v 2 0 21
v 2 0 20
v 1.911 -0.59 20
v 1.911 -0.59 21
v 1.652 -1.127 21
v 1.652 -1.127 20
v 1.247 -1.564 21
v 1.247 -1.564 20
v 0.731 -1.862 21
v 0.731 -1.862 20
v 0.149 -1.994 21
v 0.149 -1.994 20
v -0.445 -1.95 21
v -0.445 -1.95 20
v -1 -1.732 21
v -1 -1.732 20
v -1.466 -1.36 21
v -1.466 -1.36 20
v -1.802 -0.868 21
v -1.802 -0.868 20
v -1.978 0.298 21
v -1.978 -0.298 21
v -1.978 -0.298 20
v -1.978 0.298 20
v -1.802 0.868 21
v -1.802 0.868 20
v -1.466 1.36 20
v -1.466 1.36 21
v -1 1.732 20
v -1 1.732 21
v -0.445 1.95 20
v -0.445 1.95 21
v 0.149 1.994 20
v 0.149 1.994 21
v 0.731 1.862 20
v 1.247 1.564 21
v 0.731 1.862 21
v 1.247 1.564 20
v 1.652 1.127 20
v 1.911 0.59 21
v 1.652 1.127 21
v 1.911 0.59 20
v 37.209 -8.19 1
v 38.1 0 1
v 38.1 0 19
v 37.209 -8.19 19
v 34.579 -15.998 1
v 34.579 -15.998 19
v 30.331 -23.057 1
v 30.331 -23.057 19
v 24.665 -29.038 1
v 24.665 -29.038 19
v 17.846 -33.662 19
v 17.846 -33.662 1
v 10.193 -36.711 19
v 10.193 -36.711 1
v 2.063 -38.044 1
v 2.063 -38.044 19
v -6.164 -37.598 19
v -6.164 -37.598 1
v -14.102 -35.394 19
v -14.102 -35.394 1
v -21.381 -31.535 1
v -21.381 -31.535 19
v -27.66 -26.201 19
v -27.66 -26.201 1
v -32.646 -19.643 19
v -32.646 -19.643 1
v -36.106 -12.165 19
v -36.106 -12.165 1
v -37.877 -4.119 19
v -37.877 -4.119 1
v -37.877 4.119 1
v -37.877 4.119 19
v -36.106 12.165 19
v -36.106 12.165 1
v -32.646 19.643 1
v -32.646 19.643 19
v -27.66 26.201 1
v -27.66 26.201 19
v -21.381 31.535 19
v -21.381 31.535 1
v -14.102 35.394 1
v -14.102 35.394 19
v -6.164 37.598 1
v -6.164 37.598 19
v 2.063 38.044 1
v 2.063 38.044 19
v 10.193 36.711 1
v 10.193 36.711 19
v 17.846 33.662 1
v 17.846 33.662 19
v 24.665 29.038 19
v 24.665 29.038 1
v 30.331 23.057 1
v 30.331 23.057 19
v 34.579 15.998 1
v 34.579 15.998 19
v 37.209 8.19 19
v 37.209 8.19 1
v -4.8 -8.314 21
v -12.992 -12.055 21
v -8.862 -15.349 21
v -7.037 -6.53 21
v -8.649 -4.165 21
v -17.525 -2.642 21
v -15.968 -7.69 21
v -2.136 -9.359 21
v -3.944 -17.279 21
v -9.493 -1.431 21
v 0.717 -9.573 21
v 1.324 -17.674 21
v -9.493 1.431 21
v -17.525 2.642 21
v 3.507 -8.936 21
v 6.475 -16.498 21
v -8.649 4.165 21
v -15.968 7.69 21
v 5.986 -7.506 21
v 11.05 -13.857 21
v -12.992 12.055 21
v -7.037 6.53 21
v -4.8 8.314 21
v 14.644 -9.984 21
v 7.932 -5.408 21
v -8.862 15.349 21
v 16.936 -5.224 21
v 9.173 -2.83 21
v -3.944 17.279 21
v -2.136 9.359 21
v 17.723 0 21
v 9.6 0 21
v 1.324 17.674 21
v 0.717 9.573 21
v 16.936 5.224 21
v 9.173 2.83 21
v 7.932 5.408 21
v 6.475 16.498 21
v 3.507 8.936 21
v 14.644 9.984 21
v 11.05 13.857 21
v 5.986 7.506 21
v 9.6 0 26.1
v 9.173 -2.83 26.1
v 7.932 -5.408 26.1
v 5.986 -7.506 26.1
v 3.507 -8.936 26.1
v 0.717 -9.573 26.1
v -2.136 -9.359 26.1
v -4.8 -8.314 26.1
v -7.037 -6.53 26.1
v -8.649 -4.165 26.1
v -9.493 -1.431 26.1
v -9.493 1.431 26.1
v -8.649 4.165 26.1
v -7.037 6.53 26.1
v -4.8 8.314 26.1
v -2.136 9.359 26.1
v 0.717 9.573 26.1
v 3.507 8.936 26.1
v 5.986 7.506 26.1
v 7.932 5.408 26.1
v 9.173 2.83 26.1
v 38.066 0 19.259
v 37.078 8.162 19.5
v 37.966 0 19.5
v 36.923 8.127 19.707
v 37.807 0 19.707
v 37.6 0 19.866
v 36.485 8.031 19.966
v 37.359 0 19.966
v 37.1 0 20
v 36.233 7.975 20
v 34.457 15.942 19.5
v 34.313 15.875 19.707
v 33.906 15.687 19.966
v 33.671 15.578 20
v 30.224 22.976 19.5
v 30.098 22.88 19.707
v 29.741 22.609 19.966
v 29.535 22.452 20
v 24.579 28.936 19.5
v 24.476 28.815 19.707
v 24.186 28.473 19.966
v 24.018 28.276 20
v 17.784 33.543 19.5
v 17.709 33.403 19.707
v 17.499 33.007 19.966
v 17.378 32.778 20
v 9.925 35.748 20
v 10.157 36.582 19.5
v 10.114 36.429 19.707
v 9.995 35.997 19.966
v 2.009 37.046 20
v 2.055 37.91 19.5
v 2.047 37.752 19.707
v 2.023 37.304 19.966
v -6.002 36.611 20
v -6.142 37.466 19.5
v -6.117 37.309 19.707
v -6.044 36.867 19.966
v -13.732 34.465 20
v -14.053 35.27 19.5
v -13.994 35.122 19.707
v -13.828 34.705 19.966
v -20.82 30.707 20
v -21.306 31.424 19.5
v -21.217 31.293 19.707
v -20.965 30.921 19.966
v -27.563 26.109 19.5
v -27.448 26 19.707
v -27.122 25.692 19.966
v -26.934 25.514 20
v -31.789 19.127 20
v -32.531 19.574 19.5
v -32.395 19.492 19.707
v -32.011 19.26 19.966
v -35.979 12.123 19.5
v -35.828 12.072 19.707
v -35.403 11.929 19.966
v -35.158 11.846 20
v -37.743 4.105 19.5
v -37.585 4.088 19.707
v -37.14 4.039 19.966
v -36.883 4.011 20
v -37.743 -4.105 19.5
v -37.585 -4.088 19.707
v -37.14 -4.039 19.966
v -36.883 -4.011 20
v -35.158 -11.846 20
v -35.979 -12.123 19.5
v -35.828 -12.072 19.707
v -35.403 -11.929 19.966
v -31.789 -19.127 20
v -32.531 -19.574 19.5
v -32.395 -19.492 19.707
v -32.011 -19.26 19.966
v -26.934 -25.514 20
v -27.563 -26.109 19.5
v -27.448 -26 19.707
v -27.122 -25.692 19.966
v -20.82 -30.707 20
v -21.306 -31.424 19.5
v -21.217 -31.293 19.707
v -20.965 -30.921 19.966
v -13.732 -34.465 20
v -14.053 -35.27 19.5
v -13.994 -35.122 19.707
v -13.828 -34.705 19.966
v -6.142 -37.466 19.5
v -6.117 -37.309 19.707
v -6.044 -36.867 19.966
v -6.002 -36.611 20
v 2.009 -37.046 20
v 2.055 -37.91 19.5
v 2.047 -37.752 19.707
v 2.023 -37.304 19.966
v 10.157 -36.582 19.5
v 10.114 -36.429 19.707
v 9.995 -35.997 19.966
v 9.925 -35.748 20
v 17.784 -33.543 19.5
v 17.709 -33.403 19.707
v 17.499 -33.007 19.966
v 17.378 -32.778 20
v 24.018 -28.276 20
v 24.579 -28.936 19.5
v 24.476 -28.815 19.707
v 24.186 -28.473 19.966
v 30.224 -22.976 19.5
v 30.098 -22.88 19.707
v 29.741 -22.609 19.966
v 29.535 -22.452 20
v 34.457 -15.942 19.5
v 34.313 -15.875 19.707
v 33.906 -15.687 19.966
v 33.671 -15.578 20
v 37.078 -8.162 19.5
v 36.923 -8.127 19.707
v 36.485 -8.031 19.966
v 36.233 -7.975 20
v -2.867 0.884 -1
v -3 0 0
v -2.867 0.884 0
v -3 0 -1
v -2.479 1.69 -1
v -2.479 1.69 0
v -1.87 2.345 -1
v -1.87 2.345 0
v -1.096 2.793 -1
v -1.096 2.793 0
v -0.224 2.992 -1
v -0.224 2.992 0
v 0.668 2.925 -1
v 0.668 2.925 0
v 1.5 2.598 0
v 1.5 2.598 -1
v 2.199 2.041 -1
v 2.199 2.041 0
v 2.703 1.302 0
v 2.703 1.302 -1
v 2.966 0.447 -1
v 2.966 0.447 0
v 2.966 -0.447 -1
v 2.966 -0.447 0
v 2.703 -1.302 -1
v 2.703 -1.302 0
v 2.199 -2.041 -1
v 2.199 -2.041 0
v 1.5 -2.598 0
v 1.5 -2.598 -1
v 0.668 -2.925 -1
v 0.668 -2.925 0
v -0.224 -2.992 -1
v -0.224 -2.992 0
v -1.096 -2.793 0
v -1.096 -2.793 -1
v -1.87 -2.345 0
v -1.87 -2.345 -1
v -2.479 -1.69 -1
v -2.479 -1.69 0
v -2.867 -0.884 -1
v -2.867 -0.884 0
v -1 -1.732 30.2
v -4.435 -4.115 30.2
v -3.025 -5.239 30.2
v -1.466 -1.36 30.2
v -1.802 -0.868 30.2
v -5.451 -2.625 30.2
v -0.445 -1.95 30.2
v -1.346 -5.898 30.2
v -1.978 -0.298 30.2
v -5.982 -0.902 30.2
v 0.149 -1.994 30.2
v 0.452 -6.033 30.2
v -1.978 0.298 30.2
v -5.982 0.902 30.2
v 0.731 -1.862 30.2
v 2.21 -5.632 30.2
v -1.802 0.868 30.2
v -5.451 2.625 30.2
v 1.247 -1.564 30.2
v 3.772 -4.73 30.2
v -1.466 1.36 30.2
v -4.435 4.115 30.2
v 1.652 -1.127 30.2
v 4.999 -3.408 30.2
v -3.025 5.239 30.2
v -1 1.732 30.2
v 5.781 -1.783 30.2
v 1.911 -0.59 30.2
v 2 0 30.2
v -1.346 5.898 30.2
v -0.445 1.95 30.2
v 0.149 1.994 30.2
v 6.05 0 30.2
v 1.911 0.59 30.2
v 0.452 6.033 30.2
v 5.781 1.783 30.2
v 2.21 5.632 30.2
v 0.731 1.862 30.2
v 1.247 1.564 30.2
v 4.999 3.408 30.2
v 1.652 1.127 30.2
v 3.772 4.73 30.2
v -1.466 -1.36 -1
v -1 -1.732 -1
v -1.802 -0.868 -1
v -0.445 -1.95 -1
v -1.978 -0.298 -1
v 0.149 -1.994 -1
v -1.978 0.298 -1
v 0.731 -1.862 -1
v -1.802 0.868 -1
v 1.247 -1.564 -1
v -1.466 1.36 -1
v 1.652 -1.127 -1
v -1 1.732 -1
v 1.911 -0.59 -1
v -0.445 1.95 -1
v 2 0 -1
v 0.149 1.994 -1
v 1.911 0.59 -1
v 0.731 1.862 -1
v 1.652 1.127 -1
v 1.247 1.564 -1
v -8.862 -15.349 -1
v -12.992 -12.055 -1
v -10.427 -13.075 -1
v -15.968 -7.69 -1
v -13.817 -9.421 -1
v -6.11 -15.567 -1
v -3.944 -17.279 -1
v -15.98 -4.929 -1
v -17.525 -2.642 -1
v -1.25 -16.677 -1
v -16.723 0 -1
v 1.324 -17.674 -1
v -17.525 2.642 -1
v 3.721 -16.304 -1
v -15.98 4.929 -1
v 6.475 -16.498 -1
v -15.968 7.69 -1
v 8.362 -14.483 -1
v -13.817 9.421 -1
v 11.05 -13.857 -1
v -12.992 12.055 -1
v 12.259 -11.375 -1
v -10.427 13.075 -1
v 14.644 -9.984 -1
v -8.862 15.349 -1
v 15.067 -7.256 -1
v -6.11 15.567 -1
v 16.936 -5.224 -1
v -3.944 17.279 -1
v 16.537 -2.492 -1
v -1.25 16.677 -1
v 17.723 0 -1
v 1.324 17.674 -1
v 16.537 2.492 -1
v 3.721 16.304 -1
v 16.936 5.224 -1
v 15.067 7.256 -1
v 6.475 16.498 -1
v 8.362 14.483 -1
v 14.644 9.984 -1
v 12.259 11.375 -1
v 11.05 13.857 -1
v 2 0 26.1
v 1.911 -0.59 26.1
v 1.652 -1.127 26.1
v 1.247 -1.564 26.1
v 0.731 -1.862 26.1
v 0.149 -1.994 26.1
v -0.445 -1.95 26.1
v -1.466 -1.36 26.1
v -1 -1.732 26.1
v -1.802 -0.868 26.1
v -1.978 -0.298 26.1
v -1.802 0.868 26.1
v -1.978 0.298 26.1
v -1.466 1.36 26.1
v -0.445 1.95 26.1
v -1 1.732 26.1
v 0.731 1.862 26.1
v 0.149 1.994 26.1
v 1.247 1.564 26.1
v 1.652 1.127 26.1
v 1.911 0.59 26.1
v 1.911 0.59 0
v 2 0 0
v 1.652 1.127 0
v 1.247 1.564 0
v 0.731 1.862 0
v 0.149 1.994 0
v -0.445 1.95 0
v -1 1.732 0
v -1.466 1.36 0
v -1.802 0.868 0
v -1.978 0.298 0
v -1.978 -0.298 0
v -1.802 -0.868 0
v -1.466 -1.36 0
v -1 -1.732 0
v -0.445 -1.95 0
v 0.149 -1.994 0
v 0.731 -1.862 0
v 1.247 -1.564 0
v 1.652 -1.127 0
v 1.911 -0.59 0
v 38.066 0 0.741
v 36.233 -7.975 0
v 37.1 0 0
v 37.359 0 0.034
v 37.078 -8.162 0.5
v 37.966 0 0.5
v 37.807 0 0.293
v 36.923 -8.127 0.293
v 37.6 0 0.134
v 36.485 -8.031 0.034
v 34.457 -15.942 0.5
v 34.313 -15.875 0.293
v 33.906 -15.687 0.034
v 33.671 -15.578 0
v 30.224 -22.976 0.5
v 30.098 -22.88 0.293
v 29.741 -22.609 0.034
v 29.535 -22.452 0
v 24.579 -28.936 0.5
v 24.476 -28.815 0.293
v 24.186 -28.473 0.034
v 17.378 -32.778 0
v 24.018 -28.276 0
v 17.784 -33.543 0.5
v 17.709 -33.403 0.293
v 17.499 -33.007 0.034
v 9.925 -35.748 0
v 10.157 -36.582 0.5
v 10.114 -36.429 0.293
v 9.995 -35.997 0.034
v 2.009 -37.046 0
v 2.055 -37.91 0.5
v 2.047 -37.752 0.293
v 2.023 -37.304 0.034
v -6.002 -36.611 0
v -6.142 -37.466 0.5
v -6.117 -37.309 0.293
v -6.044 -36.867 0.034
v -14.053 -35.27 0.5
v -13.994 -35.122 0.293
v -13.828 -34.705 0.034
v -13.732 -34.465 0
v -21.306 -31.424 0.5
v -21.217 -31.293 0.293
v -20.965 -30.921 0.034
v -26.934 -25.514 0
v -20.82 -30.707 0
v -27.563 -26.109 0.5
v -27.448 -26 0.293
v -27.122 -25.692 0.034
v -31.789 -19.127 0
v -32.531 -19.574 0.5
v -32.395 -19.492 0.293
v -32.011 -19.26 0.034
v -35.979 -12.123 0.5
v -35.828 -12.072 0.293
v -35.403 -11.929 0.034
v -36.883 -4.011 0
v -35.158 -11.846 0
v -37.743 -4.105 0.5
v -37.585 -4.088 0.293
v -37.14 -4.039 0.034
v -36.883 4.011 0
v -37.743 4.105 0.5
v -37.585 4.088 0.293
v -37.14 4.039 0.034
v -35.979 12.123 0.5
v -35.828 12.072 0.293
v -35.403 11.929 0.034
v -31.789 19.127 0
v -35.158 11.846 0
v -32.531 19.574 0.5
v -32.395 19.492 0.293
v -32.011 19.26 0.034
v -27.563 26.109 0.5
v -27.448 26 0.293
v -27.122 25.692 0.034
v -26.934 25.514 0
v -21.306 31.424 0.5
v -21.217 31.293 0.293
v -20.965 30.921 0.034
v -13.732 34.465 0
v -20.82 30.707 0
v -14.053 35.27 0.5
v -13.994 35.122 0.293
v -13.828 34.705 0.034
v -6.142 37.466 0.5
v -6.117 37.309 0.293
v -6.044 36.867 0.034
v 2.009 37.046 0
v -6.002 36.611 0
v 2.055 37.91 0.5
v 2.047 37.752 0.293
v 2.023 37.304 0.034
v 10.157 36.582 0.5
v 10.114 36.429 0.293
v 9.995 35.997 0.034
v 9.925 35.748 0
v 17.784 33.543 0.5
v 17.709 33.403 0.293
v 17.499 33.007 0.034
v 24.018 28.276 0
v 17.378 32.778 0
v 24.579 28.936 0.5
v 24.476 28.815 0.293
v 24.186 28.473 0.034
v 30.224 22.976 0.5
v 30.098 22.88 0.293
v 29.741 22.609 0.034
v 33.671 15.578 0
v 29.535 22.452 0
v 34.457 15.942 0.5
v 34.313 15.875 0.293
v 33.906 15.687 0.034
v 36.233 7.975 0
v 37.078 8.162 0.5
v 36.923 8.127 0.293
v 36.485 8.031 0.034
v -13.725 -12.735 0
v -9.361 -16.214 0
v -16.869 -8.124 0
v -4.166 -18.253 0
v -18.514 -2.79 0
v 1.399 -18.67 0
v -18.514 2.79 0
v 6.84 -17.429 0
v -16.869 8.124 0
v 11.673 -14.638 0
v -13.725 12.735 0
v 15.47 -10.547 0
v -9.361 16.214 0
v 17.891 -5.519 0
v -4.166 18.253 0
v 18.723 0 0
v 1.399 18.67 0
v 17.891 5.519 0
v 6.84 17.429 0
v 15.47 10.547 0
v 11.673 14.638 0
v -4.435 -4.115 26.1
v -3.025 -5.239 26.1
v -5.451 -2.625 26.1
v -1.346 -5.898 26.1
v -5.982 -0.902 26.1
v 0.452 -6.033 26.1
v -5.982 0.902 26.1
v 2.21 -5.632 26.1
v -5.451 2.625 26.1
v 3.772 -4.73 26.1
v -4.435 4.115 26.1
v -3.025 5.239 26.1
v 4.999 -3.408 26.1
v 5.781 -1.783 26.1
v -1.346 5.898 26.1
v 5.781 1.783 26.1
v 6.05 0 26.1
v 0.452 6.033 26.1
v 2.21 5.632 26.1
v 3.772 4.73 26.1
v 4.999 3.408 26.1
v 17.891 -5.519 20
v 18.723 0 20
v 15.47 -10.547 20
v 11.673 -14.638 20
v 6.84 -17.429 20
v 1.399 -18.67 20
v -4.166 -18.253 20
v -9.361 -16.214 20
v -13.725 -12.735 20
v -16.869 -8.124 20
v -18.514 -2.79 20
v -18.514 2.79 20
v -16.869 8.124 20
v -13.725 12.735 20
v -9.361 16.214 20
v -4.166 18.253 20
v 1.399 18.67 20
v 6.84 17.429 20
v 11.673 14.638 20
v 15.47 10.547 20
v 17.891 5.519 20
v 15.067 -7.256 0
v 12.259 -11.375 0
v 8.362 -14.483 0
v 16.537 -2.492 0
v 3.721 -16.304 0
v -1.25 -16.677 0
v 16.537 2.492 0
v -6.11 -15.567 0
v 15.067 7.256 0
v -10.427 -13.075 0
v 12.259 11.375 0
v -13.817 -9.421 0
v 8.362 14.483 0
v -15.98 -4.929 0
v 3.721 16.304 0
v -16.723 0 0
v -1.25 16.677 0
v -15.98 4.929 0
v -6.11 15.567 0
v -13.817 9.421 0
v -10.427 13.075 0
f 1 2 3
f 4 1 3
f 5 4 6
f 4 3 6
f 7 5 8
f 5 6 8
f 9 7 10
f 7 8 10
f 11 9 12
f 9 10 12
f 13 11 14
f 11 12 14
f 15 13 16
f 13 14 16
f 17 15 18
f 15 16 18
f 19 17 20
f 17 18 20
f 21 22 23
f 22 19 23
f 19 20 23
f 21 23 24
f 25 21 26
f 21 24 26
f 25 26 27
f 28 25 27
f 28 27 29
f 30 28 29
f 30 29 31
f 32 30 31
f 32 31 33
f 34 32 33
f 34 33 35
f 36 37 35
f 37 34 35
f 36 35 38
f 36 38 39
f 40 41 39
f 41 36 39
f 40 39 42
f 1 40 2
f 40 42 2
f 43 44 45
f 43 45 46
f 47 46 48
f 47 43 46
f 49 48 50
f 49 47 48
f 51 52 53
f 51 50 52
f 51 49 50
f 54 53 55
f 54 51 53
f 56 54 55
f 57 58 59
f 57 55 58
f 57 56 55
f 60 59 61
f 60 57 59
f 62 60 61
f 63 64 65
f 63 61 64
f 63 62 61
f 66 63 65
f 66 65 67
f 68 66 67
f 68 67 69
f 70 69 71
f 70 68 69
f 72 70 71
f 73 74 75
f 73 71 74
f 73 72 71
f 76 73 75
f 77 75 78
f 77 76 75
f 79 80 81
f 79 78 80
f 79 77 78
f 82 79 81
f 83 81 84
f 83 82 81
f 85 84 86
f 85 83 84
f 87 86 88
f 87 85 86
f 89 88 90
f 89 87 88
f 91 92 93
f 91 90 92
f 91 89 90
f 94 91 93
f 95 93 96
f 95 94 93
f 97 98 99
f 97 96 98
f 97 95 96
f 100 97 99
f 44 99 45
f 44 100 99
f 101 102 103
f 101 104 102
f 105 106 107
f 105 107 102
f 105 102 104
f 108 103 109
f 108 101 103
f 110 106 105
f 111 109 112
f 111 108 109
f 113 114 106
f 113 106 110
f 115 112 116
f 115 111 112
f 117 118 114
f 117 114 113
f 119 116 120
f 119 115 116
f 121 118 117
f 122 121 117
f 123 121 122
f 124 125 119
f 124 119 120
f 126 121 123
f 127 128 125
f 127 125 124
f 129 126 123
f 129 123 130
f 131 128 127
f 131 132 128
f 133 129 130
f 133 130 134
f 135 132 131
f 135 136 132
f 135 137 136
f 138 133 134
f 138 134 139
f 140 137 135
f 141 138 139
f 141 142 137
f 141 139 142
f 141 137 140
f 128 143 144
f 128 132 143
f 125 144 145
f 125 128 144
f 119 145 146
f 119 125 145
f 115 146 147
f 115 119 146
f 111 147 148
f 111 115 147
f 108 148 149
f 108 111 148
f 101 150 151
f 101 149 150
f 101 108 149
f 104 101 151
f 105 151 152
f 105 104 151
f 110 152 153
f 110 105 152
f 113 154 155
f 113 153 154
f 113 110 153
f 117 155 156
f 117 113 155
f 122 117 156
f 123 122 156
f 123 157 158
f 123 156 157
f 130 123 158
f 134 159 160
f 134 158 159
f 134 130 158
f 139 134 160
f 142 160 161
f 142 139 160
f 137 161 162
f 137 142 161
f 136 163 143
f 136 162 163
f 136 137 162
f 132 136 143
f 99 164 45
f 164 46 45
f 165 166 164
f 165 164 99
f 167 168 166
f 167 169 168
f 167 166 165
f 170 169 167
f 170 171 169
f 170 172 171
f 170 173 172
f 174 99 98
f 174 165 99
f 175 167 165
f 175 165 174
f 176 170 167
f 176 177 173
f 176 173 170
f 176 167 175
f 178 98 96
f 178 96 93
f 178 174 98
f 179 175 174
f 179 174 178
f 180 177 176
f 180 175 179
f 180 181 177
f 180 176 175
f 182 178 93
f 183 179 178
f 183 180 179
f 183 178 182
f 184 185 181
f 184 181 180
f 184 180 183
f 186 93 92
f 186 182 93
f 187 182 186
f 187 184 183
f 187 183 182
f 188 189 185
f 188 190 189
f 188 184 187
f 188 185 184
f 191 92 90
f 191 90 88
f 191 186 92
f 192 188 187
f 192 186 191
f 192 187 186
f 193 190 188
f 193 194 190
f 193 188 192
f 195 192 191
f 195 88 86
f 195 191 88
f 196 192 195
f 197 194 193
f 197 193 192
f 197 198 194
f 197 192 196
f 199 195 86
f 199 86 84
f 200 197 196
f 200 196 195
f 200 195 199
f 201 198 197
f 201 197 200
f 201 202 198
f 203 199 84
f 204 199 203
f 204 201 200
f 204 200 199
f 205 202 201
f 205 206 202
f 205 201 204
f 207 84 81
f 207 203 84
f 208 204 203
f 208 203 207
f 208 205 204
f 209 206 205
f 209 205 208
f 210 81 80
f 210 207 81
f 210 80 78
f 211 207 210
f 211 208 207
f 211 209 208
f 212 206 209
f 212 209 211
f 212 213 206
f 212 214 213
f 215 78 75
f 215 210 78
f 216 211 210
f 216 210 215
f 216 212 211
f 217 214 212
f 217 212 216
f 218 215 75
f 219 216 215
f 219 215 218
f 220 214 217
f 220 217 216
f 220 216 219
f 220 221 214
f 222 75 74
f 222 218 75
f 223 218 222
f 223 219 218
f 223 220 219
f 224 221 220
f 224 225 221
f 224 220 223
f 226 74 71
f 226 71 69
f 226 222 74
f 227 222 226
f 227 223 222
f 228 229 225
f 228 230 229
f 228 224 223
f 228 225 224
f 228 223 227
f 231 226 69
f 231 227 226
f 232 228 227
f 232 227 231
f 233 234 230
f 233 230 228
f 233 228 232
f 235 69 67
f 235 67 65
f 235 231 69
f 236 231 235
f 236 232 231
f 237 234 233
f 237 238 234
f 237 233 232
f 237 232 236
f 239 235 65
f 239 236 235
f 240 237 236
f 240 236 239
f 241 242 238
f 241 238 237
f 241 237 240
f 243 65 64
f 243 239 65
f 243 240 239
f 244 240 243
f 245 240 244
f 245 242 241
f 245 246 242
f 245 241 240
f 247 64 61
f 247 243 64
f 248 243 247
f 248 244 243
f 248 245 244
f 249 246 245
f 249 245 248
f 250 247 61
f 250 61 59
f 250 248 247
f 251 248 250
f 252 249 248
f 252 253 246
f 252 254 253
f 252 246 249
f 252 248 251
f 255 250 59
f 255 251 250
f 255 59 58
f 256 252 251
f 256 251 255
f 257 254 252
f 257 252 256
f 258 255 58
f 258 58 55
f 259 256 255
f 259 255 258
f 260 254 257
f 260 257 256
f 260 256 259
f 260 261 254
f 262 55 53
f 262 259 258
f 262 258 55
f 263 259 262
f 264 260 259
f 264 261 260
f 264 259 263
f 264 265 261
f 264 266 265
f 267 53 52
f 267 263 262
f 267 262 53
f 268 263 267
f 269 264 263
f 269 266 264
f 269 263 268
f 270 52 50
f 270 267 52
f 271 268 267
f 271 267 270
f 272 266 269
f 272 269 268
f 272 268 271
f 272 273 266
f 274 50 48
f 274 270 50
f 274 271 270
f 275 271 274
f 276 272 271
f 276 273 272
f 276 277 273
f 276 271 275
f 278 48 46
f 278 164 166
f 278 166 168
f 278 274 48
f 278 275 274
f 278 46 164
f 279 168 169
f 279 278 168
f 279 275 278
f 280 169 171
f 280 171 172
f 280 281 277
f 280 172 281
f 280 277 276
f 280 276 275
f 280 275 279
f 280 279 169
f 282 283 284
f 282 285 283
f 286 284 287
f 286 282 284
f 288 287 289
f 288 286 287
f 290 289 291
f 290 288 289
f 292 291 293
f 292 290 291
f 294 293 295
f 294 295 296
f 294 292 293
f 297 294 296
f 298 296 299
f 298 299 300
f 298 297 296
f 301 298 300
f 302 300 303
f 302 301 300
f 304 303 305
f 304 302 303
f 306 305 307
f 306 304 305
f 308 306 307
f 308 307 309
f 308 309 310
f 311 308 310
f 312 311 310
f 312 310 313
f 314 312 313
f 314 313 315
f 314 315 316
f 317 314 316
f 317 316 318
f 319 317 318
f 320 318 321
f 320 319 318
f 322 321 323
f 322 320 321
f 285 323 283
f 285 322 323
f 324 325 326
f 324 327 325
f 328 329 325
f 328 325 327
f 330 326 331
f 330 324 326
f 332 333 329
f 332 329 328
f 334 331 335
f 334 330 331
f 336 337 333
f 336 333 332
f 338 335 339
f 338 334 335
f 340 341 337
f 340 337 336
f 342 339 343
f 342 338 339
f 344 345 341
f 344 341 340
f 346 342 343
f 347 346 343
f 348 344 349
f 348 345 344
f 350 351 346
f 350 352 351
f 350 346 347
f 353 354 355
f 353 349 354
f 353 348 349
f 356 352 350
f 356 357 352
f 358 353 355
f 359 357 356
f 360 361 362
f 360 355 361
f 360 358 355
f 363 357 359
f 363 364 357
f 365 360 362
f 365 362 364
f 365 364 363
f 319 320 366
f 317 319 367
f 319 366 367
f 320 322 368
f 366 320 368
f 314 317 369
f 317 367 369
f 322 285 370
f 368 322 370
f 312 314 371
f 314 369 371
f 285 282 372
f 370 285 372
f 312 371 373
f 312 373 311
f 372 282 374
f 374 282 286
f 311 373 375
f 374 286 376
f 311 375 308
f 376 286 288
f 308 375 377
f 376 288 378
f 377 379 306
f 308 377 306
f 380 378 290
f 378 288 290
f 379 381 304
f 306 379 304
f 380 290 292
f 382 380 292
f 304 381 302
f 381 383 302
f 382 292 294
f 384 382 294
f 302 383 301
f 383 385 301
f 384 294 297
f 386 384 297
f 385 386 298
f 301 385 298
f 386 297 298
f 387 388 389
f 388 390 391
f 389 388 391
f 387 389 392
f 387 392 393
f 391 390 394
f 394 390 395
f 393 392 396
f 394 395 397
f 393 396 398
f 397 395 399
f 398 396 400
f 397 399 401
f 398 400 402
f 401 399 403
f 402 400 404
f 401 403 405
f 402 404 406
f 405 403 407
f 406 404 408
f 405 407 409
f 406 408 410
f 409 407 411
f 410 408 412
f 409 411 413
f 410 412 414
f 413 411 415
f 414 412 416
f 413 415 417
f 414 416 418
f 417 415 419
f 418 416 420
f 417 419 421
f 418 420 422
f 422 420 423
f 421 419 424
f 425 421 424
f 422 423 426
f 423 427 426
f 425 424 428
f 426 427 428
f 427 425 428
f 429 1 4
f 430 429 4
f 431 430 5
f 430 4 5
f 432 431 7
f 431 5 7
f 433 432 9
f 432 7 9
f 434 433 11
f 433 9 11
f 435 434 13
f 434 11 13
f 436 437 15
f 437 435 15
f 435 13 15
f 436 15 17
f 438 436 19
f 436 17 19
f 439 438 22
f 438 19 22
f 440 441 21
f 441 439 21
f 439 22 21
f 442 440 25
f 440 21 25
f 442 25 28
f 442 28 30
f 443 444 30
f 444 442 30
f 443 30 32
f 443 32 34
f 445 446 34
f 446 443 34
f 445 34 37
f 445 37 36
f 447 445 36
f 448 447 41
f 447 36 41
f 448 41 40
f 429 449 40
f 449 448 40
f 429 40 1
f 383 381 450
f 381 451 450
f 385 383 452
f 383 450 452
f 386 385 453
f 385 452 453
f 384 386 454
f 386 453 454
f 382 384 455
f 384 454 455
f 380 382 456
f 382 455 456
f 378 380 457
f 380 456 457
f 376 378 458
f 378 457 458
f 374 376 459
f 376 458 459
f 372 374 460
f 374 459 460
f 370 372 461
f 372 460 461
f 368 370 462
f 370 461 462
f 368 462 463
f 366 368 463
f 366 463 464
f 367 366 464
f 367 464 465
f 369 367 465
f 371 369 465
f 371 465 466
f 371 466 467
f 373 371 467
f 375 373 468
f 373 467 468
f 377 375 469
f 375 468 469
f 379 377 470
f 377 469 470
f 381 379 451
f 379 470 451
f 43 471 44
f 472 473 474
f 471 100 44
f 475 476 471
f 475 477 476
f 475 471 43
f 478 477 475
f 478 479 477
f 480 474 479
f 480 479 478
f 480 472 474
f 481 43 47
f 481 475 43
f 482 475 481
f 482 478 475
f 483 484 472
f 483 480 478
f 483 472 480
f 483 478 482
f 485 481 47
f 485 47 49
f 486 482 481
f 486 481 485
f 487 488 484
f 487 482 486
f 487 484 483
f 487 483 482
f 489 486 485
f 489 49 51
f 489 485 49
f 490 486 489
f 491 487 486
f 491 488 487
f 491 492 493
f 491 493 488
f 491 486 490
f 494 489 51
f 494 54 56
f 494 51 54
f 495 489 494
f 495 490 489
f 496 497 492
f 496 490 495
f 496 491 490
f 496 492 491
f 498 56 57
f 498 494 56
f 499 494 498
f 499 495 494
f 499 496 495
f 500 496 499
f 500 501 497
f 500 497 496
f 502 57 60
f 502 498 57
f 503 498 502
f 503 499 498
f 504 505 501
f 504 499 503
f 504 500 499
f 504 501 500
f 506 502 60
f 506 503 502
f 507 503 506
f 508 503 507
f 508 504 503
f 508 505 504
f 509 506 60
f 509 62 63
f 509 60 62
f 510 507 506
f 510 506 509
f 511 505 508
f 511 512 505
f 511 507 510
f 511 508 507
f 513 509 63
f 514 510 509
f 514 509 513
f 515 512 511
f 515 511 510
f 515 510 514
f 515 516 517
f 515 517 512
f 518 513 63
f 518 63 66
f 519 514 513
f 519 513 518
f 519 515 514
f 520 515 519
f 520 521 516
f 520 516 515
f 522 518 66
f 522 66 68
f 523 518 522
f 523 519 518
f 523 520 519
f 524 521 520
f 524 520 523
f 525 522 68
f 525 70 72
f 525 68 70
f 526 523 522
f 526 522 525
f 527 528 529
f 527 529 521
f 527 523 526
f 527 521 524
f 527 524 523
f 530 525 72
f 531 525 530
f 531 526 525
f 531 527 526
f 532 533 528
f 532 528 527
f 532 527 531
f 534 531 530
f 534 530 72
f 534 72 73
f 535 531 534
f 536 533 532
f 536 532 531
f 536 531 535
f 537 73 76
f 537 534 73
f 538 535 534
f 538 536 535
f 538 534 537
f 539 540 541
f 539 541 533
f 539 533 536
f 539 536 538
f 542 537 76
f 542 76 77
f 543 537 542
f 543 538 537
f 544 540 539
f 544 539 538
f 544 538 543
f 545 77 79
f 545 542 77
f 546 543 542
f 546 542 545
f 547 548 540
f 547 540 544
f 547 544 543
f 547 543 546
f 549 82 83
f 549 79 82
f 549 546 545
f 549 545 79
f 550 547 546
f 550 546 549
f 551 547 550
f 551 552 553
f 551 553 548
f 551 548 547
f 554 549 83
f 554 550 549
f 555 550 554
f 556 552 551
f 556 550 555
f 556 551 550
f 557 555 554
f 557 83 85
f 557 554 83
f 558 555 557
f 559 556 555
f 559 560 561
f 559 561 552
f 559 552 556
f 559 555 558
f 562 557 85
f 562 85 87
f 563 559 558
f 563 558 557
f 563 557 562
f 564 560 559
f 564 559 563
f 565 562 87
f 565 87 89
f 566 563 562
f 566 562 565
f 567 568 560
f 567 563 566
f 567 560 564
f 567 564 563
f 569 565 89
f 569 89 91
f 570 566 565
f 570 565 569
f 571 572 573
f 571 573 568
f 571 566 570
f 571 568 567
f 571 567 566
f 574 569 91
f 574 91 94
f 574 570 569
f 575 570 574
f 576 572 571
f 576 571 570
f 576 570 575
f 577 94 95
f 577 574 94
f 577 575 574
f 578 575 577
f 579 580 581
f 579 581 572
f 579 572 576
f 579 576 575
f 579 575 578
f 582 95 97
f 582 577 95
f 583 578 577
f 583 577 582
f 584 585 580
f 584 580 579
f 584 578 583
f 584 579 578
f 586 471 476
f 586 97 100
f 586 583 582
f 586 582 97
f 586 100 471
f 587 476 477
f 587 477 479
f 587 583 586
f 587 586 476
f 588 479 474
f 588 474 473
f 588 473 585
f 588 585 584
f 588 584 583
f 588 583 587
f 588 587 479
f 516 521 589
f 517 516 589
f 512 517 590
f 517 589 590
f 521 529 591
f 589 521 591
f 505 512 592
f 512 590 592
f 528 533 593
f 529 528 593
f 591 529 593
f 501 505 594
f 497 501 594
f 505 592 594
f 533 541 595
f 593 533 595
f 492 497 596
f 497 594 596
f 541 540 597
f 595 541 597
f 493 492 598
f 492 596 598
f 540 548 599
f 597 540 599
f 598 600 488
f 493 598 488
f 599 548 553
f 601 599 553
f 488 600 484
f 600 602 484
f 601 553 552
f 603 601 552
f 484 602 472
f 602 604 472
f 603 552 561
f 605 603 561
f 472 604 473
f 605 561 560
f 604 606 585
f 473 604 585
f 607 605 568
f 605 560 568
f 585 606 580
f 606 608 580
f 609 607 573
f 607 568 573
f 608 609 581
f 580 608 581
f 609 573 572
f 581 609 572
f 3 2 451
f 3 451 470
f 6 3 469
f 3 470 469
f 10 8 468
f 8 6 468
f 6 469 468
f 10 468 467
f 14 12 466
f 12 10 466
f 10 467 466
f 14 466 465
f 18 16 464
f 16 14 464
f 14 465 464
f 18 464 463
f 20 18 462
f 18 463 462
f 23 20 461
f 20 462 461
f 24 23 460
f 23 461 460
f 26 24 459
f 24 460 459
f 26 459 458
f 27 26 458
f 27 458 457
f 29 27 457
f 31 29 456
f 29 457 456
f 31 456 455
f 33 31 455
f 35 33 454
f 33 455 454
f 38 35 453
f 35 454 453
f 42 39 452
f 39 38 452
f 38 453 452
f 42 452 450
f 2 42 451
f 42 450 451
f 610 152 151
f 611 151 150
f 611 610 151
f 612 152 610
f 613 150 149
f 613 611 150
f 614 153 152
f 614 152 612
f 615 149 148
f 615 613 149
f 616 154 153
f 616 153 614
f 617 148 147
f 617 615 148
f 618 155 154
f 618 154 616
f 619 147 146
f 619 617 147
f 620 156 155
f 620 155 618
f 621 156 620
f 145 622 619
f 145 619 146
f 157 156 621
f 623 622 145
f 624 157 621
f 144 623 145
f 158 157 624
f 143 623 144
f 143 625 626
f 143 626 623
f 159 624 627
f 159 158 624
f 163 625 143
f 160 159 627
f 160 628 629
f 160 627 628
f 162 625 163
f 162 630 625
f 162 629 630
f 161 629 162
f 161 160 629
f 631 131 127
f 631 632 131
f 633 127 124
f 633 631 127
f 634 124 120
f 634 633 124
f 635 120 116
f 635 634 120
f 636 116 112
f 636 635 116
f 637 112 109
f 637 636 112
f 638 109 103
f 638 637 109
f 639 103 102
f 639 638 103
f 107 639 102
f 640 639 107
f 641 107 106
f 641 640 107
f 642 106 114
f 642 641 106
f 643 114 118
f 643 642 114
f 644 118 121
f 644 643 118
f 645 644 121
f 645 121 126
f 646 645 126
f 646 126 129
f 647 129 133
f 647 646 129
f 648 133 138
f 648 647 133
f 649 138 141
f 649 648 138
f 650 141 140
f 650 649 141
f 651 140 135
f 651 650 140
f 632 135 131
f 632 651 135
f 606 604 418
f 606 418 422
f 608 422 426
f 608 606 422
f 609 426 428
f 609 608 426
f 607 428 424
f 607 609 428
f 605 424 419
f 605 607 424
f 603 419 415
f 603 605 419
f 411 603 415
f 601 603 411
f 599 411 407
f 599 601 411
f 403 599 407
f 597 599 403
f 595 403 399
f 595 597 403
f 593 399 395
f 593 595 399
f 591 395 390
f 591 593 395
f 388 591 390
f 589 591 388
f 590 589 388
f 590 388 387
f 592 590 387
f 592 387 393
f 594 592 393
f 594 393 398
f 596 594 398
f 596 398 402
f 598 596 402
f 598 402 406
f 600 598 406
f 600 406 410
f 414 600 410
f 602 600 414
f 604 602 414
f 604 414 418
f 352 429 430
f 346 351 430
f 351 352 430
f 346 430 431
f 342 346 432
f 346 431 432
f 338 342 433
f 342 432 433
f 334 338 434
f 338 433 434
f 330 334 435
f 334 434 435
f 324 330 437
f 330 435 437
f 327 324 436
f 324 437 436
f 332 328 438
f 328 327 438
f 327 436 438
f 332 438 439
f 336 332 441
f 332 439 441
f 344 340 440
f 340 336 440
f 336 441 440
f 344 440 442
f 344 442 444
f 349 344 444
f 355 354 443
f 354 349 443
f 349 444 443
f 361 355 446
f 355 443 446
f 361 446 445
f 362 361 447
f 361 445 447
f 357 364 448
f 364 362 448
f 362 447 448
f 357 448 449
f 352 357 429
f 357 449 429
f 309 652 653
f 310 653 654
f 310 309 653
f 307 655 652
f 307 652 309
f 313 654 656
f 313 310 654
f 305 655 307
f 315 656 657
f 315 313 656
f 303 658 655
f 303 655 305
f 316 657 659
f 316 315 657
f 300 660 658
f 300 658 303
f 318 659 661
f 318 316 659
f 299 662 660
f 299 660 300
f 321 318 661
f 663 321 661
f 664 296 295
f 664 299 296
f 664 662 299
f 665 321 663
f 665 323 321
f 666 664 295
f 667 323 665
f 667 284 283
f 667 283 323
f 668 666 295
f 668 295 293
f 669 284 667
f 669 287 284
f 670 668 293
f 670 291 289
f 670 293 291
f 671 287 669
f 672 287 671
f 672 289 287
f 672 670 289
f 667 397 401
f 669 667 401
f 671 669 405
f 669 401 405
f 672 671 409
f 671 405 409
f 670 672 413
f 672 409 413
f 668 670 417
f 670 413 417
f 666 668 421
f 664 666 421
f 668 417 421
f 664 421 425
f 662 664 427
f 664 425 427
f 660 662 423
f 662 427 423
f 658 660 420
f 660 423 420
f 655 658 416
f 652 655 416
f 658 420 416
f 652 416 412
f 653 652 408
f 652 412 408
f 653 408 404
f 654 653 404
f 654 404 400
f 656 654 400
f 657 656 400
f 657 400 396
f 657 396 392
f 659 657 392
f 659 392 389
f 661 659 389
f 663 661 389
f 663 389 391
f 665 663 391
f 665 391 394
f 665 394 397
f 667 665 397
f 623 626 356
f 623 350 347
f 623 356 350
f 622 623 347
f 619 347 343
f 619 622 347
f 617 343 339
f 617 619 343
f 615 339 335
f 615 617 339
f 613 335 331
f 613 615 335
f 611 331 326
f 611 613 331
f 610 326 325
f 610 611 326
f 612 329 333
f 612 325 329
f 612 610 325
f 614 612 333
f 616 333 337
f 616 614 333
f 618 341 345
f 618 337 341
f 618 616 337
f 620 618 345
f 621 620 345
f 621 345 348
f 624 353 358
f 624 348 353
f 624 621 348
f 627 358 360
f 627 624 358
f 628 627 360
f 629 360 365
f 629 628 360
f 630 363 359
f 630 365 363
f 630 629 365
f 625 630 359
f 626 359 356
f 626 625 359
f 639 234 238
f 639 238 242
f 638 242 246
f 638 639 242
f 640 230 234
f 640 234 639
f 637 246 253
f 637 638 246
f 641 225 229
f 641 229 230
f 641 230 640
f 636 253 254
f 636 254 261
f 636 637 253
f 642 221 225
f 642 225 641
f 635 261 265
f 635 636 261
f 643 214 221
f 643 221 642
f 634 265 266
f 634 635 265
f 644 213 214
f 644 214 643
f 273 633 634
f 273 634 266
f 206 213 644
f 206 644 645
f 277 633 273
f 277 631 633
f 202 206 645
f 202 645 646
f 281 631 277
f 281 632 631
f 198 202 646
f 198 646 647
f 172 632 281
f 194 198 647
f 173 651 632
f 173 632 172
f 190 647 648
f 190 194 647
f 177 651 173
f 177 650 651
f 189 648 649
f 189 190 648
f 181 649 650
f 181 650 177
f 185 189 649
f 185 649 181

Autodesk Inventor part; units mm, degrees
ref_plane "YZ Plane" through (0, 0, 0) normal (1, 0, 0) x (0, 1, 0)
ref_plane "XZ Plane" through (0, 0, 0) normal (0, 1, 0) x (-1, 0, 0)
ref_plane "XY Plane" through (0, 0, 0) normal (0, 0, 1) x (1, 0, 0)
sketch "Esquisse1" plane through (0, 0, 0) normal (0, 0, 1) x (1, 0, 0)
  circle A0 centre (0, 0) radius 38.1
  circle A1 centre (0, 0) radius 2
  dimension "d0" = 76.2
  dimension "d1" = 4
extrude "Extrusion1" add sketch "Esquisse1" along normal blind 20
sketch "Esquisse2" plane through (0, 0, 20) normal (0, 0, 1) x (1, 0, 0)
  circle A0 centre (0, 0) radius 2 projected
  circle A1 centre (0, 0) radius 38.1 projected
  circle A2 centre (0, 0) radius 17.7233
extrude "Extrusion2" add sketch "Esquisse2" along normal blind 1 and the other way blind 21 contours A2
fillet "Congé1" radius 1 2 edges at (-38.1, 0, 20) (-38.1, 0, 0)
chamfer "Chanfrein1" distance 1 angle 45 2 edges at (-17.7233, 0, 20) (-17.7233, 0, 0)
sketch "Esquisse3" plane through (0, 0, -1) normal (0, 0, -1) x (-1, 0, 0)
  circle A0 centre (0, 0) radius 2 projected
  circle A1 centre (0, 0) radius 17.7233 projected
  circle A2 centre (0, 0) radius 16.7233
  circle A3 centre (0, 0) radius 3
  dimension "d12" = 1
  dimension "d13" = 1
extrude "Extrusion3" cut sketch "Esquisse3" against normal blind 1 contours A2
sketch "Esquisse4" plane through (0, 0, 21) normal (0, 0, 1) x (1, 0, 0)
  circle A0 centre (0, 0) radius 9.6
  circle A1 centre (0, 0) radius 2 projected
  circle A2 centre (0, 0) radius 17.7233 projected
  dimension "d16" = 19.2
extrude "Extrusion4" add sketch "Esquisse4" along normal blind 5.1 contours A0
sketch "Esquisse5" plane through (0, 0, 26.1) normal (0, 0, 1) x (1, 0, 0)
  circle A0 centre (0, 0) radius 2 projected
  circle A1 centre (0, 0) radius 9.6 projected
  circle A2 centre (0, 0) radius 6.05
  dimension "d19" = 12.1
extrude "Extrusion5" add sketch "Esquisse5" along normal blind 4.1 contours A2
properties part number "Roue"
